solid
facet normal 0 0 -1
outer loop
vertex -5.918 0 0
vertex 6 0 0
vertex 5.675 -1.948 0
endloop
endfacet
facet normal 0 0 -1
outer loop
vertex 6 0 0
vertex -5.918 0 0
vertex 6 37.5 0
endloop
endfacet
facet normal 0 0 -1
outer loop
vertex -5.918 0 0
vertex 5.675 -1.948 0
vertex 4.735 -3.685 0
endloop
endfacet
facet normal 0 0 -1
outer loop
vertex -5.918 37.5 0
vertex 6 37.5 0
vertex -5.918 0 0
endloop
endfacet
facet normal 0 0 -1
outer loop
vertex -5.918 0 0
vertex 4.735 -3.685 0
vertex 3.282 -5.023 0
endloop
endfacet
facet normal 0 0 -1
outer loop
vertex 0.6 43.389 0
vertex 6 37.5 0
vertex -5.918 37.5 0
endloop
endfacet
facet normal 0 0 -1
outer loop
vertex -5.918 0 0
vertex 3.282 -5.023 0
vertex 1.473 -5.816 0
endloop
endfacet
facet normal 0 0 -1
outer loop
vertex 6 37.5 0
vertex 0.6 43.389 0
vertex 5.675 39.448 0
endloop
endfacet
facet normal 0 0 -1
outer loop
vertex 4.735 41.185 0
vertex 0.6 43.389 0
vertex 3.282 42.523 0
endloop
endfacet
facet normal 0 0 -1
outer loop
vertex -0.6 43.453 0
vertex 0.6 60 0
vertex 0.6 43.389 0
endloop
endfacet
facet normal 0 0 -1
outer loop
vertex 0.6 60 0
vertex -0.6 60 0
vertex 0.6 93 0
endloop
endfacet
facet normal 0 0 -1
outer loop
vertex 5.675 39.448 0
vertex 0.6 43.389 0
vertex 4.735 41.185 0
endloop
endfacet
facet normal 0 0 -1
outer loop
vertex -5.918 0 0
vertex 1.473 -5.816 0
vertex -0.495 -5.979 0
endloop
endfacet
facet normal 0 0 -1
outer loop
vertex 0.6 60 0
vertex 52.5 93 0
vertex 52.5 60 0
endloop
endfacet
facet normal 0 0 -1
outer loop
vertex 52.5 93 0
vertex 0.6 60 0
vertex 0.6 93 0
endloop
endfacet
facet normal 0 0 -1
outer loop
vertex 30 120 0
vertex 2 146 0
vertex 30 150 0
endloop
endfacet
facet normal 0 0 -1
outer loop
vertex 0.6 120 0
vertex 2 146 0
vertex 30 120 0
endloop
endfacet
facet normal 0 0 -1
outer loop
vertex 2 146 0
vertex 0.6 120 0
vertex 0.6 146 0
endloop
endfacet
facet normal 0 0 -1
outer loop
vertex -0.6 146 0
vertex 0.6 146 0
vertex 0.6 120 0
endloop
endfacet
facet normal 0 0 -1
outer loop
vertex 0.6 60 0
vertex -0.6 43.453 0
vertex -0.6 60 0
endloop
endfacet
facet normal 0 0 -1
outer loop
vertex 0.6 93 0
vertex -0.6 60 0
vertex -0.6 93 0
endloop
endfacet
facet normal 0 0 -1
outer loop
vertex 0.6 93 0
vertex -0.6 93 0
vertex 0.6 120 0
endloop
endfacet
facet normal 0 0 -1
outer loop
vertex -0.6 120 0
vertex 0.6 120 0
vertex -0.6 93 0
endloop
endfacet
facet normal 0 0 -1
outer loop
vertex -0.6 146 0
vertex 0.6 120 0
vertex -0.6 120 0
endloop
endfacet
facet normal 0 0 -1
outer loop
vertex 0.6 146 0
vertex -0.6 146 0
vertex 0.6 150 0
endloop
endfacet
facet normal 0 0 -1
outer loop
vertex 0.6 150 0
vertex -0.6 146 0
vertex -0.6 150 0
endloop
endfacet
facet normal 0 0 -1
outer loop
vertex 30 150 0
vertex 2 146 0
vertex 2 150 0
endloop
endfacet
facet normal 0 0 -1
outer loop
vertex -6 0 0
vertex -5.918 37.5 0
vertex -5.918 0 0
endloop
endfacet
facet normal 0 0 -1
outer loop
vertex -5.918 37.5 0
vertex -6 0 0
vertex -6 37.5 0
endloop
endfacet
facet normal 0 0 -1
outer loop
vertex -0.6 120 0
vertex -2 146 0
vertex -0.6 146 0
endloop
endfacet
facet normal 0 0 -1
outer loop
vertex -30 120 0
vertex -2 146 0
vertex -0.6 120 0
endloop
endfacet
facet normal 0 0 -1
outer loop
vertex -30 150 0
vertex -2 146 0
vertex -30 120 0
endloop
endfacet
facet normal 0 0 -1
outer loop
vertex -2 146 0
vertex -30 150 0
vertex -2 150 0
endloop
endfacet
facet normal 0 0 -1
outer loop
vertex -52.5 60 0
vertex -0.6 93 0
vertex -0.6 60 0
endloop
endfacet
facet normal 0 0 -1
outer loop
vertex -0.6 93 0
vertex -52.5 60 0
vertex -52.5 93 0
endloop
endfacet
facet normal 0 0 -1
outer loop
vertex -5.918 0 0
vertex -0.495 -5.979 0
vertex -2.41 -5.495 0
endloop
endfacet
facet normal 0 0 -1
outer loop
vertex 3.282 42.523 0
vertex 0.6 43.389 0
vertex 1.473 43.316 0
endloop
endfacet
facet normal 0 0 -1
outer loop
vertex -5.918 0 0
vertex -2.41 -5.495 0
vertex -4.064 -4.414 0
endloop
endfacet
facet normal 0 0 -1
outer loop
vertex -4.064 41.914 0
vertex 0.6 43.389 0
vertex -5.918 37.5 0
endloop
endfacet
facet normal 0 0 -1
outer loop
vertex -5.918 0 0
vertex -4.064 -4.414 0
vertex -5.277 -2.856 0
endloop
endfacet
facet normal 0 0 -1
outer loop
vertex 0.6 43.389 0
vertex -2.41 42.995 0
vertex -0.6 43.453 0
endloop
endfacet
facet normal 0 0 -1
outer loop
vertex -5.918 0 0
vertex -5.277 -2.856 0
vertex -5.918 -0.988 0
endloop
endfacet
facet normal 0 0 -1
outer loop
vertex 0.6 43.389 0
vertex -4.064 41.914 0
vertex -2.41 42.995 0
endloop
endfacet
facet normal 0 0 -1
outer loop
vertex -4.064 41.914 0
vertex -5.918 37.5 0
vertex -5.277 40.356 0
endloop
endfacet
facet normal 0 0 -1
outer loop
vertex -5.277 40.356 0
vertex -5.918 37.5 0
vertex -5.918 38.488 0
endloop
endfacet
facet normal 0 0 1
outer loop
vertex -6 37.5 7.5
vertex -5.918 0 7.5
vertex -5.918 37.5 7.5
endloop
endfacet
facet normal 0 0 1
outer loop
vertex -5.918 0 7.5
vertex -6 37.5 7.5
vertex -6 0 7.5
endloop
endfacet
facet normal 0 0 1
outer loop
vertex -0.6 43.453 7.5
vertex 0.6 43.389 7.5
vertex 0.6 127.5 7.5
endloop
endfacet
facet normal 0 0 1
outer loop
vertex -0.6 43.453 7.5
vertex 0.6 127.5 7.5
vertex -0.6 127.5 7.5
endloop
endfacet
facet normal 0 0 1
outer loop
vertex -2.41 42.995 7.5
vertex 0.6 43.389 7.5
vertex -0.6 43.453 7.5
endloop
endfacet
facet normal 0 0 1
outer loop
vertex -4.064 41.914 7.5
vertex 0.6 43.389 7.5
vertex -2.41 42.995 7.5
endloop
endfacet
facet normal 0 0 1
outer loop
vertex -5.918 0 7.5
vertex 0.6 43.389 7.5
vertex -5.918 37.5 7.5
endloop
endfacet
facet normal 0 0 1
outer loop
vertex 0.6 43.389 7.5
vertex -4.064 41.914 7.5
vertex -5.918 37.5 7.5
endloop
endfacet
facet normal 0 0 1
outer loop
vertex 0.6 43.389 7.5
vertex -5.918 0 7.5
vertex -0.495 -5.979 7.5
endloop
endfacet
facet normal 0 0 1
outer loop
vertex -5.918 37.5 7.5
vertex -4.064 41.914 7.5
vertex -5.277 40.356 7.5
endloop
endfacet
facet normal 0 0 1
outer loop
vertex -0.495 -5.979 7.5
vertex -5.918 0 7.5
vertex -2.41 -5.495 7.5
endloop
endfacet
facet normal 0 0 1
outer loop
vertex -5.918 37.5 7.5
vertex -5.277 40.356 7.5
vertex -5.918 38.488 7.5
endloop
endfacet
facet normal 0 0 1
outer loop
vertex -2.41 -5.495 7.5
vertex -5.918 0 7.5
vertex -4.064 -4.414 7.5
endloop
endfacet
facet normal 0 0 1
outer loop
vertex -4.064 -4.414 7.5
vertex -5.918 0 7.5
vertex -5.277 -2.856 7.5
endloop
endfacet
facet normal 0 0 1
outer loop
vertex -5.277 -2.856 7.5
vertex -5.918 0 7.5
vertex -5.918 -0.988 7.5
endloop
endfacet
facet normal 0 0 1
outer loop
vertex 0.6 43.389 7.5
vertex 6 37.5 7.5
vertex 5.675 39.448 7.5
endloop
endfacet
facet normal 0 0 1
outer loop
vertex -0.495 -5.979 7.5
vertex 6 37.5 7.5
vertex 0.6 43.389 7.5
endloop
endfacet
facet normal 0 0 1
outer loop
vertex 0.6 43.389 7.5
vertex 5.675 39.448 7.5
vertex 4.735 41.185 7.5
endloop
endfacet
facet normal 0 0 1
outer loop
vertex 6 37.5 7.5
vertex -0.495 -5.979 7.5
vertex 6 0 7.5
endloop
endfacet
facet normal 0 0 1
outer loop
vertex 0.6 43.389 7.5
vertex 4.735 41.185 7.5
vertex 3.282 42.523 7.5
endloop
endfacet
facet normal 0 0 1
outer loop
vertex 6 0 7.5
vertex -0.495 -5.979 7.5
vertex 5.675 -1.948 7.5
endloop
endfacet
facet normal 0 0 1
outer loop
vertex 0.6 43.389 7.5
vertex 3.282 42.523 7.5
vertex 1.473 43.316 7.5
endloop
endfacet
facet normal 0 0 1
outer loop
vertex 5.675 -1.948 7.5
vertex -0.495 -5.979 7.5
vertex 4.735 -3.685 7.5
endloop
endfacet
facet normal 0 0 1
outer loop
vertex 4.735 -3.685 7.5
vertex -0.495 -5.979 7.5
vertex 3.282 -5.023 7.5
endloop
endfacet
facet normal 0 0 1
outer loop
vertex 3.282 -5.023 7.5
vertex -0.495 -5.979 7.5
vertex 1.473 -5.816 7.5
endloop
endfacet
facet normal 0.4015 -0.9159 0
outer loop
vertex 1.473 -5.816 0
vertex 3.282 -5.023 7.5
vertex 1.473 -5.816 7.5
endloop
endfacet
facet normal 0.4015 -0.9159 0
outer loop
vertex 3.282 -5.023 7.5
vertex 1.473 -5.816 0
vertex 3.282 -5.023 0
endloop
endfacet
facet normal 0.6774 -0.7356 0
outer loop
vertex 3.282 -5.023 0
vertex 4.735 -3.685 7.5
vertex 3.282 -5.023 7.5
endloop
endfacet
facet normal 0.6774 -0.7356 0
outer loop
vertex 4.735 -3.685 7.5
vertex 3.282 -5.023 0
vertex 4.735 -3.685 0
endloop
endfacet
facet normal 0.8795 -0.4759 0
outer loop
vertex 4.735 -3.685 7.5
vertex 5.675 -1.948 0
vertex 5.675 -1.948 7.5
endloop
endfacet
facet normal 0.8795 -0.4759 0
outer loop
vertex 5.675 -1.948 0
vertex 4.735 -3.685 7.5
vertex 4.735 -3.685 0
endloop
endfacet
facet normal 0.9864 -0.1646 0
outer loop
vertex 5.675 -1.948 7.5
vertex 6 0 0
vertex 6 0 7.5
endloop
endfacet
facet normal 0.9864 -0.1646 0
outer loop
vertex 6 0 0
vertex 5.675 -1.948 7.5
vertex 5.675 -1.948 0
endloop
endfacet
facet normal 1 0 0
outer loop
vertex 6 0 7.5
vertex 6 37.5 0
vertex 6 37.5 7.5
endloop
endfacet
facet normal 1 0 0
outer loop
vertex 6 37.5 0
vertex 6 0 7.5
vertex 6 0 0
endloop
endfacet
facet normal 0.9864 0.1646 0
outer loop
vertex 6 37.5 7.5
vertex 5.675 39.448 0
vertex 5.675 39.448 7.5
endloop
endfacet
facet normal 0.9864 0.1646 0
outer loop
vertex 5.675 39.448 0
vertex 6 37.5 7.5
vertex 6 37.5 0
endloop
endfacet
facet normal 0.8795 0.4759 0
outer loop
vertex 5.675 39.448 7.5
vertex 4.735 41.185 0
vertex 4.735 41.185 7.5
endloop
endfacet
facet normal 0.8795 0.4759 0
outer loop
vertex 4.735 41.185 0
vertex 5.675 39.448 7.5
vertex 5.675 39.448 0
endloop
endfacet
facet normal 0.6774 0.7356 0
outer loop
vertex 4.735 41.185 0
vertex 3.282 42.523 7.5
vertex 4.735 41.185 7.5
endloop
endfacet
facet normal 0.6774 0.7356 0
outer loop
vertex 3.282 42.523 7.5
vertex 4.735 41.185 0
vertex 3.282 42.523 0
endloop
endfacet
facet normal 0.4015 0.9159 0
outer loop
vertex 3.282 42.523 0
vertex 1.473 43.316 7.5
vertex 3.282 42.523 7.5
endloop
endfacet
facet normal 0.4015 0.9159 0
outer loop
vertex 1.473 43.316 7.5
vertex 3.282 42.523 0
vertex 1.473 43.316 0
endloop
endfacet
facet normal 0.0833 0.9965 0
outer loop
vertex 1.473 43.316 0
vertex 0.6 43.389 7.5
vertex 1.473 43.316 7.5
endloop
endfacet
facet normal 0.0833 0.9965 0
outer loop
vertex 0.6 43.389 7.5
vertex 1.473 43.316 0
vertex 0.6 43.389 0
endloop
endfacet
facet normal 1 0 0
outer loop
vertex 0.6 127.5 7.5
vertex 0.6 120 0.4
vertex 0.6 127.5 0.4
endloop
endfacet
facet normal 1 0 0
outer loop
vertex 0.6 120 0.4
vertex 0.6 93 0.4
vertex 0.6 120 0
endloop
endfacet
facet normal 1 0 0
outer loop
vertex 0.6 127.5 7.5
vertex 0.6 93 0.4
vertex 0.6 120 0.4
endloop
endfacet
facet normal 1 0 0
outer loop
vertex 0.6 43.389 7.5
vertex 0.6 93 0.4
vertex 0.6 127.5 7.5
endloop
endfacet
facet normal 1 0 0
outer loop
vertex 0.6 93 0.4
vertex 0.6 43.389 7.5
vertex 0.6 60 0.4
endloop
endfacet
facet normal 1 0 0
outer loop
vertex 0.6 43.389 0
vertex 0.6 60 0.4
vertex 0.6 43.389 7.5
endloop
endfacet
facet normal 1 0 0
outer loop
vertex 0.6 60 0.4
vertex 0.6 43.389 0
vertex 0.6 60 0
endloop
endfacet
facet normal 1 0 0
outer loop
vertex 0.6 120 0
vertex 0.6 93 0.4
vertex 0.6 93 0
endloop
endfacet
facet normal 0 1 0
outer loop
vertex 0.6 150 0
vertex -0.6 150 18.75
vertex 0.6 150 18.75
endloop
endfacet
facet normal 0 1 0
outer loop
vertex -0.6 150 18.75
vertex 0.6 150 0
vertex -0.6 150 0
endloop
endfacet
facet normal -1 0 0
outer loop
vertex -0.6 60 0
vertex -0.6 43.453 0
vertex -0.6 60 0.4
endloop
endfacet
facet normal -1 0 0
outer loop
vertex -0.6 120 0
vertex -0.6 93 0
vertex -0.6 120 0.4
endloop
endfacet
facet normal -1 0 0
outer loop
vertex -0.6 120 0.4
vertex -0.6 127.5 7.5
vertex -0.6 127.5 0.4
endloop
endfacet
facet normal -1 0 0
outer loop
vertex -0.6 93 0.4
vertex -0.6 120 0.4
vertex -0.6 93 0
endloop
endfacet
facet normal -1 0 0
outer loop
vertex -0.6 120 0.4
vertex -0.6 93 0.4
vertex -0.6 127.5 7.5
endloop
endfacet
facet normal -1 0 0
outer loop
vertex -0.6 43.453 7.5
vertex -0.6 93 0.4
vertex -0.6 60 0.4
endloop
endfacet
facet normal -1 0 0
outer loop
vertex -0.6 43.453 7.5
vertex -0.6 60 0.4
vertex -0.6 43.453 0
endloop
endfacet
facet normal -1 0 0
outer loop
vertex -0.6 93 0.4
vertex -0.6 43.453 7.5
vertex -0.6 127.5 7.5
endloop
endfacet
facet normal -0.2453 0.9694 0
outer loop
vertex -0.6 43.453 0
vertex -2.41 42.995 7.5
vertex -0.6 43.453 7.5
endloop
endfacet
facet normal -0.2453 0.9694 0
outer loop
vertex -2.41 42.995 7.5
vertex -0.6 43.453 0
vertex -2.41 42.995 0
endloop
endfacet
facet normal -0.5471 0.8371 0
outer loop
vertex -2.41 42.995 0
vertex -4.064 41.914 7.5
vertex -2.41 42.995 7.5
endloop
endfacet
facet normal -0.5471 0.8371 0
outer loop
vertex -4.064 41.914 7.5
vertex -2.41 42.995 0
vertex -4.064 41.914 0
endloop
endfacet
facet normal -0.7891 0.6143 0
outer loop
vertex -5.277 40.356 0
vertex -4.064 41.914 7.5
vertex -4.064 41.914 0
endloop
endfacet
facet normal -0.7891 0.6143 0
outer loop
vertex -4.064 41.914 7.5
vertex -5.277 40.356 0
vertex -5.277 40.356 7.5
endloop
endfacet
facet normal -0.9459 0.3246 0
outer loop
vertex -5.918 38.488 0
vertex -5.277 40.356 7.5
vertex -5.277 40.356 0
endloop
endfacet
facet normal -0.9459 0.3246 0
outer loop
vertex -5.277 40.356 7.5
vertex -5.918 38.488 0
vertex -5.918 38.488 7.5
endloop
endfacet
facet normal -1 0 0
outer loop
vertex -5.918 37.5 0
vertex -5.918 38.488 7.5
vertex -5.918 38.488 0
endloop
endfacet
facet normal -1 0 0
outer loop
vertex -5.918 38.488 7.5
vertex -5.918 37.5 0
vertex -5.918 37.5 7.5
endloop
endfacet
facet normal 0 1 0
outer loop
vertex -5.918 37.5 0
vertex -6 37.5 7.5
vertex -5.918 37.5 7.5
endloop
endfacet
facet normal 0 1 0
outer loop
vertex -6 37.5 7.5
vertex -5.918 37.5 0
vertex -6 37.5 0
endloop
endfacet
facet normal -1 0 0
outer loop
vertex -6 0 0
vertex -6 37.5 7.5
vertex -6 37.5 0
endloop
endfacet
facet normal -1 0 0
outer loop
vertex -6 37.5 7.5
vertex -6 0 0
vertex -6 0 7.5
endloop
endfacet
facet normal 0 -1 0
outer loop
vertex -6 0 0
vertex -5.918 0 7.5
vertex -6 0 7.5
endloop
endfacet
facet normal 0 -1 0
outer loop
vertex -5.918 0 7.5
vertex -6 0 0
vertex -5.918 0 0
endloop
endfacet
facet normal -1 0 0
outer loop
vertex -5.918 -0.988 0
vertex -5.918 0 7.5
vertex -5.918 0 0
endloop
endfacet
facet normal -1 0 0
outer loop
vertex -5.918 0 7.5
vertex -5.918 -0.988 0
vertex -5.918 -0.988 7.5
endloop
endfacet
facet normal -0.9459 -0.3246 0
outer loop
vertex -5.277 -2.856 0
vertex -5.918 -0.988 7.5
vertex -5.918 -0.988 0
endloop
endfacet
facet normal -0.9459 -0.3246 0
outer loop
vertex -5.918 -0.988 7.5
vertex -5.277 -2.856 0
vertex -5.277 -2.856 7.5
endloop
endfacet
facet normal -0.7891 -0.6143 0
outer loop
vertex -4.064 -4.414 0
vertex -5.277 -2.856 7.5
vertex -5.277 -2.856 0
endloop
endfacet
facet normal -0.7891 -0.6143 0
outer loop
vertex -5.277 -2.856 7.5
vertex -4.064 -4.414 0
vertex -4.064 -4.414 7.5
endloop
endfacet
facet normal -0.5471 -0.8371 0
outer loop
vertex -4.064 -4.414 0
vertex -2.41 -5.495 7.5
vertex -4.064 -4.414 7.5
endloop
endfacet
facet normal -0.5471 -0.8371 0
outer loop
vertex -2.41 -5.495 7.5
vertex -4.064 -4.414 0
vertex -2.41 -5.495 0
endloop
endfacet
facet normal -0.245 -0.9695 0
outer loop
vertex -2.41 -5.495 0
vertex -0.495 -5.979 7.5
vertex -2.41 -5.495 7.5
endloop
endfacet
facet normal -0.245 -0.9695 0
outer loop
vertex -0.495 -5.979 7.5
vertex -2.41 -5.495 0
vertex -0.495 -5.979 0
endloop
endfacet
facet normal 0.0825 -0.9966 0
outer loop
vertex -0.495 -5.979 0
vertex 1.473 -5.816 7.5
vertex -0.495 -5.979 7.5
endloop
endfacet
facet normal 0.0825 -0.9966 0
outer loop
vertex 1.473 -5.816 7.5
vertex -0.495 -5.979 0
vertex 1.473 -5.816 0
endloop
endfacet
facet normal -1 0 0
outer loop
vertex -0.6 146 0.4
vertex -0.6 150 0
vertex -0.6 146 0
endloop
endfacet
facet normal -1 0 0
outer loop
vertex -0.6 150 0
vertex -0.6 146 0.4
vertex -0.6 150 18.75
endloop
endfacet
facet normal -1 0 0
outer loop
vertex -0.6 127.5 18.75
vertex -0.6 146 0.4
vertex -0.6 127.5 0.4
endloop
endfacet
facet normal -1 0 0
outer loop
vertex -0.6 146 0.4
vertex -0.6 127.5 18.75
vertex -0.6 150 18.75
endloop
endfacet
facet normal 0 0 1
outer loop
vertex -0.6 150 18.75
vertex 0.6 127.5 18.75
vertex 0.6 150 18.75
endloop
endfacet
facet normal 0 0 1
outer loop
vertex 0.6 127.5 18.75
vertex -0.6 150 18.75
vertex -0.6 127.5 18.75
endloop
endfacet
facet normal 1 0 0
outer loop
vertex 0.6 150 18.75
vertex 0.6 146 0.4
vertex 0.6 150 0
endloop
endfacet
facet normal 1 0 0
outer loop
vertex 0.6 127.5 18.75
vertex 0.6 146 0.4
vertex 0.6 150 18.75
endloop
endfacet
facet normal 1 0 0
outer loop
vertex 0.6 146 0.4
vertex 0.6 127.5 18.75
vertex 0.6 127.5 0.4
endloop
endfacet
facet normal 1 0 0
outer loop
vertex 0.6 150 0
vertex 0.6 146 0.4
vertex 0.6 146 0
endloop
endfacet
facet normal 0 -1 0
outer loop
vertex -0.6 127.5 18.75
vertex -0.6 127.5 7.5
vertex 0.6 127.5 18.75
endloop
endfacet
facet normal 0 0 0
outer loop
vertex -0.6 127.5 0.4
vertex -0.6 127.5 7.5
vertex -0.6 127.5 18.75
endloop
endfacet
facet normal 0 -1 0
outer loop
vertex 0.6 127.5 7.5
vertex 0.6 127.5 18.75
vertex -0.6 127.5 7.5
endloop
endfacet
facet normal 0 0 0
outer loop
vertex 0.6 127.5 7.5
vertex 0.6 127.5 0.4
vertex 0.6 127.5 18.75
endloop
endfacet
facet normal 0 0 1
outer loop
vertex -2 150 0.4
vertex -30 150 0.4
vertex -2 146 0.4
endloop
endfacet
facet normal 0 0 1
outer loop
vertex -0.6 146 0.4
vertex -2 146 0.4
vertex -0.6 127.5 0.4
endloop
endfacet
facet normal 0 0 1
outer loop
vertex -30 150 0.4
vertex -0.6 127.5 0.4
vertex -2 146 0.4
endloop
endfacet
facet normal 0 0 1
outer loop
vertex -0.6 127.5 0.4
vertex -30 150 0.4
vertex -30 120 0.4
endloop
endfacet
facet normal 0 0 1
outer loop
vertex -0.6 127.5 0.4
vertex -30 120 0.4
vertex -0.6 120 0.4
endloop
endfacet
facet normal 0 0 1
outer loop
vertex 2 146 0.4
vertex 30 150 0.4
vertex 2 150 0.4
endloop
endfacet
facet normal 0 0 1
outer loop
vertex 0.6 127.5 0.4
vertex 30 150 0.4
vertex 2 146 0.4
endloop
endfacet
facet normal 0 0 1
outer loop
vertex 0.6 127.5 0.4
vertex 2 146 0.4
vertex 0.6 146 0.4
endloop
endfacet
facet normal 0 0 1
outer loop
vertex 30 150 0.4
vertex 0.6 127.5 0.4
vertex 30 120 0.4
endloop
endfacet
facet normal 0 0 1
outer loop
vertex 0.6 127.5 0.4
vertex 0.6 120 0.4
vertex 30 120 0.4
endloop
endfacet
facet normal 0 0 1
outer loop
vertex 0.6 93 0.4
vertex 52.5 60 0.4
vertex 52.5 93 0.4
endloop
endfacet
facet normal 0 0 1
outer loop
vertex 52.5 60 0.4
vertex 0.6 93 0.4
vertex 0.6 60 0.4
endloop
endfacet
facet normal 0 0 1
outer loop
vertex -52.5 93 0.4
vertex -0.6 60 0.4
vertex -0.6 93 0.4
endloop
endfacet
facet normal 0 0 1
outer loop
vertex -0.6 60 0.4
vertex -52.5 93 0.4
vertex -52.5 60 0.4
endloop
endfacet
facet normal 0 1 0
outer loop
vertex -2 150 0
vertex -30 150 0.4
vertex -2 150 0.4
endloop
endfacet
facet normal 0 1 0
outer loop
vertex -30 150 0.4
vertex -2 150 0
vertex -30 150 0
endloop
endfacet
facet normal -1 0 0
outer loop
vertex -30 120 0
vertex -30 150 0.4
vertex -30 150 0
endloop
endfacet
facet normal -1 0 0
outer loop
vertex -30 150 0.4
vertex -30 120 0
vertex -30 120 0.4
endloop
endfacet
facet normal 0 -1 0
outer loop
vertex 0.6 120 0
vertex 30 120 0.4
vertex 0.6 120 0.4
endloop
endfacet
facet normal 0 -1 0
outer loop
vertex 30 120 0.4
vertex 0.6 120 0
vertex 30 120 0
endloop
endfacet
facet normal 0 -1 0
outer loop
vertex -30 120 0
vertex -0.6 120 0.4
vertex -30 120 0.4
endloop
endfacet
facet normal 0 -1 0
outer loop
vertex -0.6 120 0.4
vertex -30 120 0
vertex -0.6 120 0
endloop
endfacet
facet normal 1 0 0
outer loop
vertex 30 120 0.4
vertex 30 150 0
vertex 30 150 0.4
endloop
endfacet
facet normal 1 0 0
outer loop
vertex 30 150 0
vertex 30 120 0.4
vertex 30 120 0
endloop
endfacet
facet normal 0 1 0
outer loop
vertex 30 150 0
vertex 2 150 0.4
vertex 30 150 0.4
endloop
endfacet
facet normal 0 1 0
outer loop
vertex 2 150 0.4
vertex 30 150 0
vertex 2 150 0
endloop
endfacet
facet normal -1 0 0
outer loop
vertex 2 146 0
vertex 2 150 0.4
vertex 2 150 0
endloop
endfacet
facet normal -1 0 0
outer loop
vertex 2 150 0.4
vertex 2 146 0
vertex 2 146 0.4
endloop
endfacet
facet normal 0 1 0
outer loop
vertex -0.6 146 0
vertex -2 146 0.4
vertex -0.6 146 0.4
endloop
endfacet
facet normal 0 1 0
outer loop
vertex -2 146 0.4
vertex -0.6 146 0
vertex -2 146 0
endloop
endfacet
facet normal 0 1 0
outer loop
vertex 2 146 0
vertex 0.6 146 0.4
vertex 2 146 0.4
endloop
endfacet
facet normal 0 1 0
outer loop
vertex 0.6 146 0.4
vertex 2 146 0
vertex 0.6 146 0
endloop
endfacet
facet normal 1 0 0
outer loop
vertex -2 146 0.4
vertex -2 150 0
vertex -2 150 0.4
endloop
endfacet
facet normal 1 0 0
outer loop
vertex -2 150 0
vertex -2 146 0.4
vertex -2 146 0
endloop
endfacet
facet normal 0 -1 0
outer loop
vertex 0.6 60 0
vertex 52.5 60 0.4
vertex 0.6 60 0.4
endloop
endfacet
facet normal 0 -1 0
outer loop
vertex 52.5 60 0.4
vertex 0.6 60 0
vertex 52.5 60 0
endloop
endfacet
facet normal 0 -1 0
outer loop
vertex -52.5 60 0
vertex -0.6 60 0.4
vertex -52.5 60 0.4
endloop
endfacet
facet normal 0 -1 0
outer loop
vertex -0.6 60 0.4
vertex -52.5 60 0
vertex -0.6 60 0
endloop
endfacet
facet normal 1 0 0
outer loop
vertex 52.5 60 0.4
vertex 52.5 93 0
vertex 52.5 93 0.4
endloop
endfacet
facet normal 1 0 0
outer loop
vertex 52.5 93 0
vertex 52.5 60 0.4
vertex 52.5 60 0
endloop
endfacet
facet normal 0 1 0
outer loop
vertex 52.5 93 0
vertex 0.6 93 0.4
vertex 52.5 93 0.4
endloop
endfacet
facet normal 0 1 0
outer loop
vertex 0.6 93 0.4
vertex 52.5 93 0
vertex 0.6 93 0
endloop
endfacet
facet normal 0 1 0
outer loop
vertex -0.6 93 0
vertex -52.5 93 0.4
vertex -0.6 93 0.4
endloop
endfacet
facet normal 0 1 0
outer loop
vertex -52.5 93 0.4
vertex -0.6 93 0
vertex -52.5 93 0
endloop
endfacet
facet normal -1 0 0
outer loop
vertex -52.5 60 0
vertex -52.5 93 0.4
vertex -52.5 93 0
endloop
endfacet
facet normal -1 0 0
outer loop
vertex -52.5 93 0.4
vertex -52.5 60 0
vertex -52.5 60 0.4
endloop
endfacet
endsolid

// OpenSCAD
//How Long the Glider is
size = 150;//[50:300]

//How Thick Is your First Printing Layer
flthick = .4;//

module fuse(){
    linear_extrude(size*.05)
    union(){
    circle(size*.04);
translate([-size*.04,0]){    
    square([size*.08,size/4]);}
    translate([0,size/4]){ 
circle(size*.04);}
translate([-flthick*1.5,0]){

square([flthick*3,size]);}
}}

module wing (){
translate([0,size*.4]){
square([size*.35,.22*size]);}
}

module tailfin(){
    difference(){
translate([0,.8*size]){  
square([.2*size,.2*size]);}
translate([0,size-flthick*10]){
square([flthick*5,flthick*10]);
    }}
}

module vstab(){
translate([-flthick*1.5,.85*size]){
        linear_extrude(.125*size)
square([flthick*3,.15*size]);}
}



fuse();
vstab();

linear_extrude(flthick)

union(){
wing();
mirror([1,0]){wing();}
tailfin();
mirror([1,0]){tailfin();}}
